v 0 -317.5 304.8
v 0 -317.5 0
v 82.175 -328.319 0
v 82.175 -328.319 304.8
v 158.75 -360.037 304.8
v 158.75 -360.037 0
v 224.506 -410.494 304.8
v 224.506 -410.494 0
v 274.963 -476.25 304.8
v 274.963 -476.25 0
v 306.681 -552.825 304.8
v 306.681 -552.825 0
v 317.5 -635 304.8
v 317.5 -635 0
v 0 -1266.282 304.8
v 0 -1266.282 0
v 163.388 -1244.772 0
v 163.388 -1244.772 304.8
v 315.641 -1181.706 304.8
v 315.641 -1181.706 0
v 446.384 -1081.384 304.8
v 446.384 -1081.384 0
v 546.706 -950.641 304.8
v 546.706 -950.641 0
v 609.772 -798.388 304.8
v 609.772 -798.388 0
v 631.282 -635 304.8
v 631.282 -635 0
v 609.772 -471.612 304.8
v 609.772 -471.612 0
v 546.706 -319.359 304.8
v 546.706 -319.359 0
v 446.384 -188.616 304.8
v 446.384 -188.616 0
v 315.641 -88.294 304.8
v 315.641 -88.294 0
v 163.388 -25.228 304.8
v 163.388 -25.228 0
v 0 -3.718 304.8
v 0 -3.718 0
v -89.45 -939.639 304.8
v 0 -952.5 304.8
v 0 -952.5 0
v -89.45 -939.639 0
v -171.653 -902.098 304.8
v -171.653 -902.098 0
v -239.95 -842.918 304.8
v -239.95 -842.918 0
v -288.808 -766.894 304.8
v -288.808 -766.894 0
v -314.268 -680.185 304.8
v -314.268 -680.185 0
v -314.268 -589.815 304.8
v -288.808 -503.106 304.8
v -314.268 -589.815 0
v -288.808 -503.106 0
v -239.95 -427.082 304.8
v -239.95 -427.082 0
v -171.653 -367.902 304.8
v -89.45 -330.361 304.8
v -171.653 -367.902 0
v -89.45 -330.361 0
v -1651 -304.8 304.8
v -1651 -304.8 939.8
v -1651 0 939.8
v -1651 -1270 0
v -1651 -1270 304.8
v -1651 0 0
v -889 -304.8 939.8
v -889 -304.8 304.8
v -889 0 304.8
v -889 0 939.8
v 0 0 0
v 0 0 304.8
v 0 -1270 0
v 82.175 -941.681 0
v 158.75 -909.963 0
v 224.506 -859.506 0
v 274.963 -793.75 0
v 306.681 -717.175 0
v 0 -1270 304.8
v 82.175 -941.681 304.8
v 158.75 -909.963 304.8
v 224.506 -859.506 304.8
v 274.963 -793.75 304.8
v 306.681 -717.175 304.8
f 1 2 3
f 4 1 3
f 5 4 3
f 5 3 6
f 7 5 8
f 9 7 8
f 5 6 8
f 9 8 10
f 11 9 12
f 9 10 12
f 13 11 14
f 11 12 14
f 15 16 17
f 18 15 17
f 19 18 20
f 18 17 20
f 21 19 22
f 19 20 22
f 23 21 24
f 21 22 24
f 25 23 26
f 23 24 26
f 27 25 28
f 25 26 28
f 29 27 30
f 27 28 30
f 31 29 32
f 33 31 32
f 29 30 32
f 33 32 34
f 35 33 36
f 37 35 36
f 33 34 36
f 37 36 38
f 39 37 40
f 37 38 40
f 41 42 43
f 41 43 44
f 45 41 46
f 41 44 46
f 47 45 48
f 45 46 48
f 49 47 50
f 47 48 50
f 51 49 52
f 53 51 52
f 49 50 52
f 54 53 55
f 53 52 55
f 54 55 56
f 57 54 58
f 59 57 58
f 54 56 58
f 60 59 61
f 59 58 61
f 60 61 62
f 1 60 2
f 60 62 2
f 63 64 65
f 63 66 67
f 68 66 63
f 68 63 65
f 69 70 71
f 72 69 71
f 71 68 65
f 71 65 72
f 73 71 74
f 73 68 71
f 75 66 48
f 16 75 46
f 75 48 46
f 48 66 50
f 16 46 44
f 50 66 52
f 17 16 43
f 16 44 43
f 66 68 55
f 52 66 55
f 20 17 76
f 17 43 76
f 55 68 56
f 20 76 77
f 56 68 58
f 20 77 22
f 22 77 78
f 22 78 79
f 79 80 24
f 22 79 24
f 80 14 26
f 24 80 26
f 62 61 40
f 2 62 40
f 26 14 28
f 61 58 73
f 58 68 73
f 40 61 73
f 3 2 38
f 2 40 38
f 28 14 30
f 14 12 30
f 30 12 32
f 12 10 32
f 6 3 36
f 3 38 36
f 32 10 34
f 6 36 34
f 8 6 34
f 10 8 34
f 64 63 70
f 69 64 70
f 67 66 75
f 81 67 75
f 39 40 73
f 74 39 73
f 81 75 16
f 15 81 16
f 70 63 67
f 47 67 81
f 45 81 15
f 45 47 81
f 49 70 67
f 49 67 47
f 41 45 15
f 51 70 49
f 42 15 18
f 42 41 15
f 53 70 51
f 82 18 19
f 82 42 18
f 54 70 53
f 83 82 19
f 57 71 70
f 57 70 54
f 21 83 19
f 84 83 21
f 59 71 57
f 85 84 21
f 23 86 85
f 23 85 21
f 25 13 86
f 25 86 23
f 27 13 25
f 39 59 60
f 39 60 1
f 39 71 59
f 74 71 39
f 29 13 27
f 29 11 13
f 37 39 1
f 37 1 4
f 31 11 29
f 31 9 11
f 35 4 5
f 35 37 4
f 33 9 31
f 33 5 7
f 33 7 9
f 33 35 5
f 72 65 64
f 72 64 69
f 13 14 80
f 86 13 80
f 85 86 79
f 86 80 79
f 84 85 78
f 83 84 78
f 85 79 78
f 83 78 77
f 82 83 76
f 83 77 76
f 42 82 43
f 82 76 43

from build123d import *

# Parameters (mm, degrees)
F1_DEPTH = 304.8
F2_W     = 762
F2_H     = 304.8
F3_DEPTH = 635


with BuildPart() as f1:
    # F0 (on Top) → F1 (new body)
    with BuildSketch(Plane.XY):
        with BuildLine():
            Line((0, -3.717796), (0, 0))
            Line((0, 0), (-1651, 0))
            Line((-1651, 0), (-1651, -1270))
            Line((-1651, -1270), (0, -1270))
            Line((0, -1270), (0, -1266.282204))
            Line((0, -1266.282204), (0, -952.5))
            ThreePointArc((0, -952.5), (-317.5, -635), (0, -317.5))
            Line((0, -317.5), (0, -3.717796))
        make_face()
        with BuildLine():
            ThreePointArc((0, -1266.282204), (631.282204, -635), (0, -3.717796))
            Line((0, -3.717796), (0, -317.5))
            ThreePointArc((0, -317.5), (224.506403, -410.493597), (317.5, -635))
            ThreePointArc((317.5, -635), (224.506403, -859.506403), (0, -952.5))
            Line((0, -952.5), (0, -1266.282204))
        make_face()
    extrude(amount=F1_DEPTH)

    # F2 (on face) → F3 (join)
    with BuildSketch(Plane.XY.offset(304.8)):
        with Locations((-1270, -152.4)):
            Rectangle(F2_W, F2_H)
    extrude(amount=F3_DEPTH)


solid = f1.part
